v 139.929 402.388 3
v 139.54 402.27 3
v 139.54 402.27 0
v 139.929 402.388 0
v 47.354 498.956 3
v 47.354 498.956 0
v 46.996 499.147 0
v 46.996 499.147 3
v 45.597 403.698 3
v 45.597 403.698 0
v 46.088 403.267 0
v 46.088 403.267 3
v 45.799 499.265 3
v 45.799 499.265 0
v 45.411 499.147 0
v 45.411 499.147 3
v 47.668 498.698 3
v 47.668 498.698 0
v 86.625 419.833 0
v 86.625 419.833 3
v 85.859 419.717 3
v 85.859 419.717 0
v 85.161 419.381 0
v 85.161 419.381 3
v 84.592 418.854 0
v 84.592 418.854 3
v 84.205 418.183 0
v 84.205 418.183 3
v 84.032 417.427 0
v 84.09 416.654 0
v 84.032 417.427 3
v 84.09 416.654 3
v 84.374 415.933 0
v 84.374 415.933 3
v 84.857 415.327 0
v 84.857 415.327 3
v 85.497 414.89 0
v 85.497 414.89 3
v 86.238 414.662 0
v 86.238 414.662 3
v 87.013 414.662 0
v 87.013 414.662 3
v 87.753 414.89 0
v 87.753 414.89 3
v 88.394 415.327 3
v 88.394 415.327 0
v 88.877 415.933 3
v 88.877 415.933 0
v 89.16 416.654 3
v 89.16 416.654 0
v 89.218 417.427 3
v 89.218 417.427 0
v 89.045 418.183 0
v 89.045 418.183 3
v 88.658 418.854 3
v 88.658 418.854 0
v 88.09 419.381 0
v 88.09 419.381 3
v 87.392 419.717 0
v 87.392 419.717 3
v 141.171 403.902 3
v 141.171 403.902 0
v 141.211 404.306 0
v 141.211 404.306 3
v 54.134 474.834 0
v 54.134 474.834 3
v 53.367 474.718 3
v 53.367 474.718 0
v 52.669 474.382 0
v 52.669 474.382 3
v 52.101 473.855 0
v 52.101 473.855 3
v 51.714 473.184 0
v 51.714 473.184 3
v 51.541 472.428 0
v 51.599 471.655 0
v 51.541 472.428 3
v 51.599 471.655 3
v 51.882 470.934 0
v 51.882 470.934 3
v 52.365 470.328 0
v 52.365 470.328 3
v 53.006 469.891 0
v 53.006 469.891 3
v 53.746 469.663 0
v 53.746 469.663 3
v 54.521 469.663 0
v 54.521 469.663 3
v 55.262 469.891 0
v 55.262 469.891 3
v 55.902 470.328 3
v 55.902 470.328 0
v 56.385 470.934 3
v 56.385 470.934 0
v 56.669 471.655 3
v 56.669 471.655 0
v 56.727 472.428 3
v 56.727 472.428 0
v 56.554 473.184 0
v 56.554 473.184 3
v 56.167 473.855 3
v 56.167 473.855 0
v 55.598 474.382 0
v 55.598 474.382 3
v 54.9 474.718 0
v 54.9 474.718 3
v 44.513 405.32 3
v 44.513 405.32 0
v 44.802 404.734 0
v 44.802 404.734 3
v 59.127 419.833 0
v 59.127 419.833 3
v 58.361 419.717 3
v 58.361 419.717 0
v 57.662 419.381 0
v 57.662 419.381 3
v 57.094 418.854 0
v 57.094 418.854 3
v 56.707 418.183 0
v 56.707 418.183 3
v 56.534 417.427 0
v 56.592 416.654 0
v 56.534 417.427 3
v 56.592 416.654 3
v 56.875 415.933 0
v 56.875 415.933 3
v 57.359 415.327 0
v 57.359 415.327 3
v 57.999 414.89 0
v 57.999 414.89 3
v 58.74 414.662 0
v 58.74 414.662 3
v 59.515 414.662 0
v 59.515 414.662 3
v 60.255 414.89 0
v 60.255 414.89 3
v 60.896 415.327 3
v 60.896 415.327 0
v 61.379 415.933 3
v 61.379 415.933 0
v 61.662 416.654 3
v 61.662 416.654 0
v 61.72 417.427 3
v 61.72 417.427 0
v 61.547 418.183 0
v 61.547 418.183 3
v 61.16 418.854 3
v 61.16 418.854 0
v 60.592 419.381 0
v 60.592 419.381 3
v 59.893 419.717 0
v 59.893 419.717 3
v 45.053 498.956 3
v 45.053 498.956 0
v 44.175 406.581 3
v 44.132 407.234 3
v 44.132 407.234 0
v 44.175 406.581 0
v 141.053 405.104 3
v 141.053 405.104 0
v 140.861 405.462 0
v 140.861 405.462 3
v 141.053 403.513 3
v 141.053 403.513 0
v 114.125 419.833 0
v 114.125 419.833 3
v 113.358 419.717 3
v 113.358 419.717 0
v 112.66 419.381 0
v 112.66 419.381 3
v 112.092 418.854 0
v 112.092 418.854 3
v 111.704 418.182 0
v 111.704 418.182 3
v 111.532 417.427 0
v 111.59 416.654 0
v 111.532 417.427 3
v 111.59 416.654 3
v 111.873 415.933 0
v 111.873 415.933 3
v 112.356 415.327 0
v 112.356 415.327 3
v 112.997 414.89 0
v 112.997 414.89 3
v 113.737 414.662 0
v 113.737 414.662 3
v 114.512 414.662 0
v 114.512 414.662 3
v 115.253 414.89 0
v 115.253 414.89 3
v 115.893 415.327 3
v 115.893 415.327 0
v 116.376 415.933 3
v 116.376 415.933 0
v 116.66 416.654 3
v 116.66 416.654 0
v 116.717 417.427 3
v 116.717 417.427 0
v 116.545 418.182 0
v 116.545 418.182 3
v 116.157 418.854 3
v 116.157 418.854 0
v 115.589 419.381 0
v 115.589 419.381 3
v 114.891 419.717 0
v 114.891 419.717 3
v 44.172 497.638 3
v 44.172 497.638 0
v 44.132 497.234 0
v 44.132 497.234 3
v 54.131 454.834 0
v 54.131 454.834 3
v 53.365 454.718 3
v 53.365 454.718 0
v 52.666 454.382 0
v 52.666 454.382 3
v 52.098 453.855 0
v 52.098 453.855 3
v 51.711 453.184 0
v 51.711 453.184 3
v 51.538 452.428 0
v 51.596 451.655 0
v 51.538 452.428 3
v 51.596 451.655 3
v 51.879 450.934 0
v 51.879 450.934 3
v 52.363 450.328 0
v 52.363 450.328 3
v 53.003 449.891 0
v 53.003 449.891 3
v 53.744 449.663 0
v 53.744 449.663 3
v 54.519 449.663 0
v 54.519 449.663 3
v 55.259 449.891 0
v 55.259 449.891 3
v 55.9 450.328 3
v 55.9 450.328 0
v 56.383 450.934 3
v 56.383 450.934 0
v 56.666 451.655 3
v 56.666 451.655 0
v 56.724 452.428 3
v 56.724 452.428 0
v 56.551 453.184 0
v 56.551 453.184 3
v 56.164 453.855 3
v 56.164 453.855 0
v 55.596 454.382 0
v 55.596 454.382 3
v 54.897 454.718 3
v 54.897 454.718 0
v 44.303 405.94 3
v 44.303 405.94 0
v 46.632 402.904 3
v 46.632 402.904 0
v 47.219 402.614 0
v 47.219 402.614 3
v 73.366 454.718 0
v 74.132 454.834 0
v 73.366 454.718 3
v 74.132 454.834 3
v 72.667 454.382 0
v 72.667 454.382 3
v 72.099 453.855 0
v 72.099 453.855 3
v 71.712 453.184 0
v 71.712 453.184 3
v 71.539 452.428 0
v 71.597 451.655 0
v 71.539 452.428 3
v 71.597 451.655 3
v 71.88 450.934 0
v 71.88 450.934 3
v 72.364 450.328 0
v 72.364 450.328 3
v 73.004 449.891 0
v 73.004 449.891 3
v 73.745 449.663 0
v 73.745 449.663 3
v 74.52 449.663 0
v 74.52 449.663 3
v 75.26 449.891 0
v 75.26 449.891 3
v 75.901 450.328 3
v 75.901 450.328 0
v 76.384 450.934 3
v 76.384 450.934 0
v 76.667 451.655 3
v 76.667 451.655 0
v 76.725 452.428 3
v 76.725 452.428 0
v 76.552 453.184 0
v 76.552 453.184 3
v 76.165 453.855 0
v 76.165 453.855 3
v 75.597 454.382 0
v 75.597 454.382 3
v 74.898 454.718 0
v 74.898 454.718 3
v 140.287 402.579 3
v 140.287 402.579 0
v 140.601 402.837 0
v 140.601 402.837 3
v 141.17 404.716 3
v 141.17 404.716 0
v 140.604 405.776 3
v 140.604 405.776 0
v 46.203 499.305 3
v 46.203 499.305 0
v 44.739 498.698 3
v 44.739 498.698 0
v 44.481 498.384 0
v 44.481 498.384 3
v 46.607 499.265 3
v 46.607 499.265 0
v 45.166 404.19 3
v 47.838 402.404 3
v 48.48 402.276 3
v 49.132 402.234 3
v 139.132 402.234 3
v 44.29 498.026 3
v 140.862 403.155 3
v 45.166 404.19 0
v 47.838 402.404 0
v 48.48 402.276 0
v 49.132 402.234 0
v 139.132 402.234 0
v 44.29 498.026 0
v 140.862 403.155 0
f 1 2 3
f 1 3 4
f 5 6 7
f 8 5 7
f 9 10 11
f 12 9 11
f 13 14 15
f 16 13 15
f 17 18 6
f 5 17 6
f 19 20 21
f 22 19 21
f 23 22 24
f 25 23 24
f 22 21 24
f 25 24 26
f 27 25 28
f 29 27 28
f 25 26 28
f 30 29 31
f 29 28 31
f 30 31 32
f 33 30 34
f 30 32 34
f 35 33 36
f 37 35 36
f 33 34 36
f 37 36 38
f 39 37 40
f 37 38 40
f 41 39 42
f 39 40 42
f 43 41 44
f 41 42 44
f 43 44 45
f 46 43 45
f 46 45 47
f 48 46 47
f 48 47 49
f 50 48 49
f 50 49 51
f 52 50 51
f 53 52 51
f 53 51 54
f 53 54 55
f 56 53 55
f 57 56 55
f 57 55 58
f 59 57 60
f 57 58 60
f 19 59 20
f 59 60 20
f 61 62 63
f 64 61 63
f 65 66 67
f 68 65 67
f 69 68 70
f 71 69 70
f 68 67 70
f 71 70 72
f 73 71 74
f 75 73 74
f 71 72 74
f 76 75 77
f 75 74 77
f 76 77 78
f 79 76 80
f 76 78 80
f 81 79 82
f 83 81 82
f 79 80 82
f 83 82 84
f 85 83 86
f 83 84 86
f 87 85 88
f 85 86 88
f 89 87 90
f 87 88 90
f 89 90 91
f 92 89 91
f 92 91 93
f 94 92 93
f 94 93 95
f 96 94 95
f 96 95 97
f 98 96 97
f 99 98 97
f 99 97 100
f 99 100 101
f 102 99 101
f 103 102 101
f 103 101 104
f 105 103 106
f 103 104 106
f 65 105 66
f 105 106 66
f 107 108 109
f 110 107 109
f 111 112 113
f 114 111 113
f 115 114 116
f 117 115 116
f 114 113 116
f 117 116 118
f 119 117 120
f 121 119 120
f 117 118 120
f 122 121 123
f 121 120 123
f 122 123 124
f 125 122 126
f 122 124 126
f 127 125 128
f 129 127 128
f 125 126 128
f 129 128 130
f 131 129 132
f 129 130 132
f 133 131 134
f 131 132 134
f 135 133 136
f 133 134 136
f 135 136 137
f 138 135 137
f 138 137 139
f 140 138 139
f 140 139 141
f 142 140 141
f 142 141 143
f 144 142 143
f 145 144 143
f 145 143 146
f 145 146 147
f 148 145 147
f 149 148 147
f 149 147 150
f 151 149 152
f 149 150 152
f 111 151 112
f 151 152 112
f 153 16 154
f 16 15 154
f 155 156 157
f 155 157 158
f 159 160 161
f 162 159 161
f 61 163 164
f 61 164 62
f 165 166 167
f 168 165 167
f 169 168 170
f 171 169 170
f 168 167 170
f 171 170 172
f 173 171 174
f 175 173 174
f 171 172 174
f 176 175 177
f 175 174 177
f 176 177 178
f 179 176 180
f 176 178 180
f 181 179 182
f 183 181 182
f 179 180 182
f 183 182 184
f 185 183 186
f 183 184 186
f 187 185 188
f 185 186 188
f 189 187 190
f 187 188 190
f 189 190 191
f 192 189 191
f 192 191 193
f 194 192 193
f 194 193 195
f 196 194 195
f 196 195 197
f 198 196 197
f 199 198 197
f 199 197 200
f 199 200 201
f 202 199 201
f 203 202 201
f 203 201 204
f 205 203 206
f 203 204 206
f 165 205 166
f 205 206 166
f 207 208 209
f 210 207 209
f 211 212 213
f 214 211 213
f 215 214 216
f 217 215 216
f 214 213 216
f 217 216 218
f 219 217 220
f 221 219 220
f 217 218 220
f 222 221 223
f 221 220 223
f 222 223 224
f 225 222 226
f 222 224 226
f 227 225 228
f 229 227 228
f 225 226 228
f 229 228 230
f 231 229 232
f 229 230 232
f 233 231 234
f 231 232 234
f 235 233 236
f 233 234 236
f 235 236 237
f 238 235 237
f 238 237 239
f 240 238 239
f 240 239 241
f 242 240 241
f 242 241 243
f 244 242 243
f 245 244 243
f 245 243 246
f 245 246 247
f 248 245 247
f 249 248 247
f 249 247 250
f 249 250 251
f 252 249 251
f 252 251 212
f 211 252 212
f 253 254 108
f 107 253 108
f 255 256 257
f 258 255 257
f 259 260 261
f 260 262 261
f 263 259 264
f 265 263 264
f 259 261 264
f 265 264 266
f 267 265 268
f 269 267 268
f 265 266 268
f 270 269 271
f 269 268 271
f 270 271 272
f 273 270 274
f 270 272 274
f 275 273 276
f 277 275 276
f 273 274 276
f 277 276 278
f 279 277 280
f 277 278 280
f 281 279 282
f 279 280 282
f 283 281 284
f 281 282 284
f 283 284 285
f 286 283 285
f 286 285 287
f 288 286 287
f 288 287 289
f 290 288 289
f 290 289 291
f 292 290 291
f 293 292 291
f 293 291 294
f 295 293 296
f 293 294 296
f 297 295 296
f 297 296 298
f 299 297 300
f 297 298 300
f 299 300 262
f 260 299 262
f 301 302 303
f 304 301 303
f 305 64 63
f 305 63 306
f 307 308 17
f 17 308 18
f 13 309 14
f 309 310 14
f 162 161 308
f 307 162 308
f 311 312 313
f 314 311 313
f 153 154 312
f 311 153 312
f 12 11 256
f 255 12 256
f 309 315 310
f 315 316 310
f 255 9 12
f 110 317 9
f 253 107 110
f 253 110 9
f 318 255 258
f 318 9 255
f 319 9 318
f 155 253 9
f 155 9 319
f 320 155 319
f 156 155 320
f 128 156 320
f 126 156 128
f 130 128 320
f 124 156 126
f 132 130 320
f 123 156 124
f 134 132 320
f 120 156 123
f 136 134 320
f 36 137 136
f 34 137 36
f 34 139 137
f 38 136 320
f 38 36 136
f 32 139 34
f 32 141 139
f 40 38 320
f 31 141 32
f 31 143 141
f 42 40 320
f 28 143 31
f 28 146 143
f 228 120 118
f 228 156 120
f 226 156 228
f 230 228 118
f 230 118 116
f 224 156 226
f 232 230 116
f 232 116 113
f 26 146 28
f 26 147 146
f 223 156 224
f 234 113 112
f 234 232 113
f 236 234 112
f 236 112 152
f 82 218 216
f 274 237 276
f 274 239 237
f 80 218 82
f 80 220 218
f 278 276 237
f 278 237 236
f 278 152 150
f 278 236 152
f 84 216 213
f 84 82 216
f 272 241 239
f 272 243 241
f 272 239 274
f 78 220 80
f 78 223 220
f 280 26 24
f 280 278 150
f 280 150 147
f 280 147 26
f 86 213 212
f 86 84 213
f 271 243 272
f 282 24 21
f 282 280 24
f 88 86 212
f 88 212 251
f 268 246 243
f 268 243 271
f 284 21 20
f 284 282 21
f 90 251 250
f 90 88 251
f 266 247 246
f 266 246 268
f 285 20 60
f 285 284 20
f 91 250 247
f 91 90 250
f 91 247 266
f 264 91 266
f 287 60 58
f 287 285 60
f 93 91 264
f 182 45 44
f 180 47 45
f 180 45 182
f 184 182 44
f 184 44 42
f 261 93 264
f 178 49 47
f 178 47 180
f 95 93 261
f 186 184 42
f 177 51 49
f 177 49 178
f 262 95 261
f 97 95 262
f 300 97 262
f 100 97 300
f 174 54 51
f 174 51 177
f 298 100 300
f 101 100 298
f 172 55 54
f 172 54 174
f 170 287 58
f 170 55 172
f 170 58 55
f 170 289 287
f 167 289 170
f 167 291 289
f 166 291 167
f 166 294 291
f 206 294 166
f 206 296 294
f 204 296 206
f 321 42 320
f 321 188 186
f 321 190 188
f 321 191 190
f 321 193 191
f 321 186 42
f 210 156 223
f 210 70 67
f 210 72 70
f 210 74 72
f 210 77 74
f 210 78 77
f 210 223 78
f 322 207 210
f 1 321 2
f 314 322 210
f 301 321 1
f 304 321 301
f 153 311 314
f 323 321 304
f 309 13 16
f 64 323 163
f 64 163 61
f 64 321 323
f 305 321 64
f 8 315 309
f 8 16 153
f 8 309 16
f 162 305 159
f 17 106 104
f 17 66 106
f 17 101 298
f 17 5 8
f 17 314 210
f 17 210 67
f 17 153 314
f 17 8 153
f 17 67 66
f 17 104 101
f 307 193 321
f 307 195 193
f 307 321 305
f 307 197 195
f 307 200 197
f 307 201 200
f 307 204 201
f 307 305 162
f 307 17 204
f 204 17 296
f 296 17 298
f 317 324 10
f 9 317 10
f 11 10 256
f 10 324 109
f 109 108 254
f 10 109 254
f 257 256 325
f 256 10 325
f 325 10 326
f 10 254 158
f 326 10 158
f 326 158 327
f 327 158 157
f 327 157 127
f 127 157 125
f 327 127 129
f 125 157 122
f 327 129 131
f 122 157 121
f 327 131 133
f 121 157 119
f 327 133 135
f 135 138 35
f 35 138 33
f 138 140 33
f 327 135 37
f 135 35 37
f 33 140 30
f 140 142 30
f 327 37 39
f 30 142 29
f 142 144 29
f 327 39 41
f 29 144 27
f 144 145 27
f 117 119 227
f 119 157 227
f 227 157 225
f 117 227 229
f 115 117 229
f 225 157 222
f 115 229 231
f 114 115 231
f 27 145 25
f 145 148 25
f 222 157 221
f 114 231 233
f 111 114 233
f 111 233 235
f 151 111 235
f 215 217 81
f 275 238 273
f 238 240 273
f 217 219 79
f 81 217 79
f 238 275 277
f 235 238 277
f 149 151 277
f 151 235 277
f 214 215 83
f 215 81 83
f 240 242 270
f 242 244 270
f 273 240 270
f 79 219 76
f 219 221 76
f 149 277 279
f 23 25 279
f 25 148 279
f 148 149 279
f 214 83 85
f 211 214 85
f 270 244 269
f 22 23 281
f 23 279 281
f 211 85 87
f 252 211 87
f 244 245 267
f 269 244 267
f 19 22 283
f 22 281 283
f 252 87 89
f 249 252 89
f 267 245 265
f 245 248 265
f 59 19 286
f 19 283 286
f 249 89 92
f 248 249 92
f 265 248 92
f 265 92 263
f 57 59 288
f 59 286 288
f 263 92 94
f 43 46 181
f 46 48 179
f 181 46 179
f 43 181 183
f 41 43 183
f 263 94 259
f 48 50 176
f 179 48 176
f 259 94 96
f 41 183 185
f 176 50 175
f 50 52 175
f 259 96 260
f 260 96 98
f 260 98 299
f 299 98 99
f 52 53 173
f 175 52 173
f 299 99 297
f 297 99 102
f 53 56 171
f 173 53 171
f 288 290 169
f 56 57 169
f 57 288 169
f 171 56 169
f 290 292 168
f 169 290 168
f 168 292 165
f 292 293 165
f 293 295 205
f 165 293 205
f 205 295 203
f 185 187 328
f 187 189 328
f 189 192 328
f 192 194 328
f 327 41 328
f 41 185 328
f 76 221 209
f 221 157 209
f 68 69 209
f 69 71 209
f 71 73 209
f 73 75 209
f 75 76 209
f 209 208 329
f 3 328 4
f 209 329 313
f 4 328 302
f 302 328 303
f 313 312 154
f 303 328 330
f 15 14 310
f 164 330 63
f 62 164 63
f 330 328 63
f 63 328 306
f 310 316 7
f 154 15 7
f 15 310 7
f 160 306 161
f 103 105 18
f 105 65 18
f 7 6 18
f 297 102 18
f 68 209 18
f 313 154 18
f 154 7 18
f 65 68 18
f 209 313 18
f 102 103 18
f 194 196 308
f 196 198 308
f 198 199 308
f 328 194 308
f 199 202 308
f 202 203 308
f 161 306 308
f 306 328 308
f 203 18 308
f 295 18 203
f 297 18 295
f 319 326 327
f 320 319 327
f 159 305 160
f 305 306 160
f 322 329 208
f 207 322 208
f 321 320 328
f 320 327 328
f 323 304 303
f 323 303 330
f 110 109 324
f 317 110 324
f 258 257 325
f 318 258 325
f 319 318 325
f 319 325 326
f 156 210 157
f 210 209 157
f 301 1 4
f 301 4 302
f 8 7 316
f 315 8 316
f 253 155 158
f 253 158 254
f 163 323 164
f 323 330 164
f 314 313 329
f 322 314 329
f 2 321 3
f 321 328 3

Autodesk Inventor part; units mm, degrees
ref_plane "YZ Plane" through (0, 0, 0) normal (1, 0, 0) x (0, 1, 0)
ref_plane "XZ Plane" through (0, 0, 0) normal (0, 1, 0) x (-1, 0, 0)
ref_plane "XY Plane" through (0, 0, 0) normal (0, 0, 1) x (1, 0, 0)
sketch "Sketch1" plane through (0, 0, 0) normal (0, 0, 1) x (1, 0, 0)
  line L0 (141.1705, 404.7157) -> (141.0527, 405.1042)
  line L1 (141.0527, 405.1042) -> (140.8612, 405.4623)
  line L2 (140.8612, 405.4623) -> (140.6037, 405.7761)
  line L3 (140.6037, 405.7761) -> (47.6678, 498.6981)
  line L4 (47.6678, 498.6981) -> (47.354, 498.9557)
  line L5 (47.354, 498.9557) -> (46.9959, 499.1471)
  line L6 (46.9959, 499.1471) -> (46.6074, 499.265)
  line L7 (46.6074, 499.265) -> (46.2034, 499.3048)
  line L8 (46.2034, 499.3048) -> (45.7993, 499.265)
  line L9 (45.7993, 499.265) -> (45.4108, 499.1471)
  line L10 (45.4108, 499.1471) -> (45.0528, 498.9557)
  line L11 (45.0528, 498.9557) -> (44.7389, 498.6982)
  line L12 (44.7389, 498.6982) -> (44.4814, 498.3843)
  line L13 (44.4814, 498.3843) -> (44.29, 498.0263)
  line L14 (44.29, 498.0263) -> (44.1721, 497.6378)
  line L15 (44.1721, 497.6378) -> (44.1323, 497.2337)
  line L16 (44.1323, 497.2337) -> (44.1323, 407.2337)
  line L17 (44.1323, 407.2337) -> (44.1751, 406.5811)
  line L18 (44.1751, 406.5811) -> (44.3027, 405.9396)
  line L19 (44.3027, 405.9396) -> (44.5129, 405.3203)
  line L20 (44.5129, 405.3203) -> (44.8022, 404.7337)
  line L21 (44.8022, 404.7337) -> (45.1655, 404.1899)
  line L22 (45.1655, 404.1899) -> (45.5968, 403.6982)
  line L23 (45.5968, 403.6982) -> (46.0885, 403.2669)
  line L24 (46.0885, 403.2669) -> (46.6323, 402.9036)
  line L25 (46.6323, 402.9036) -> (47.2189, 402.6143)
  line L26 (47.2189, 402.6143) -> (47.8382, 402.4041)
  line L27 (47.8382, 402.4041) -> (48.4797, 402.2765)
  line L28 (48.4797, 402.2765) -> (49.1323, 402.2337)
  line L29 (49.1323, 402.2337) -> (139.1323, 402.2337)
  line L30 (139.1323, 402.2337) -> (139.5404, 402.2701)
  line L31 (139.5404, 402.2701) -> (139.929, 402.3879)
  line L32 (139.929, 402.3879) -> (140.287, 402.5794)
  line L33 (140.287, 402.5794) -> (140.6008, 402.8369)
  line L34 (140.6008, 402.8369) -> (140.8618, 403.1549)
  line L35 (140.8618, 403.1549) -> (141.0532, 403.513)
  line L36 (141.0532, 403.513) -> (141.1711, 403.9015)
  line L37 (141.1711, 403.9015) -> (141.2109, 404.3055)
  line L38 (141.2109, 404.3055) -> (141.1705, 404.7157)
  line L39 (89.0593, 417.8849) -> (88.8076, 418.4926)
  line L40 (88.8076, 418.4926) -> (88.4071, 419.0145)
  line L41 (88.4071, 419.0145) -> (87.8852, 419.415)
  line L42 (87.8852, 419.415) -> (87.2774, 419.6668)
  line L43 (87.2774, 419.6668) -> (86.6252, 419.7526)
  line L44 (86.6252, 419.7526) -> (85.973, 419.6669)
  line L45 (85.973, 419.6669) -> (85.3652, 419.4151)
  line L46 (85.3652, 419.4151) -> (84.8433, 419.0147)
  line L47 (84.8433, 419.0147) -> (84.4428, 418.4928)
  line L48 (84.4428, 418.4928) -> (84.1911, 417.885)
  line L49 (84.1911, 417.885) -> (84.1052, 417.2328)
  line L50 (84.1052, 417.2328) -> (84.191, 416.5805)
  line L51 (84.191, 416.5805) -> (84.4427, 415.9728)
  line L52 (84.4427, 415.9728) -> (84.8432, 415.4509)
  line L53 (84.8432, 415.4509) -> (85.3651, 415.0503)
  line L54 (85.3651, 415.0503) -> (85.9728, 414.7986)
  line L55 (85.9728, 414.7986) -> (86.6251, 414.7128)
  line L56 (86.6251, 414.7128) -> (87.2773, 414.7985)
  line L57 (87.2773, 414.7985) -> (87.8851, 415.0503)
  line L58 (87.8851, 415.0503) -> (88.407, 415.4507)
  line L59 (88.407, 415.4507) -> (88.8075, 415.9726)
  line L60 (88.8075, 415.9726) -> (89.0592, 416.5803)
  line L61 (89.0592, 416.5803) -> (89.1451, 417.2326)
  line L62 (89.1451, 417.2326) -> (89.0593, 417.8849)
  line L63 (61.5613, 417.885) -> (61.3095, 418.4929)
  line L64 (61.3095, 418.4929) -> (60.9091, 419.0148)
  line L65 (60.9091, 419.0148) -> (60.3872, 419.4153)
  line L66 (60.3872, 419.4153) -> (59.7794, 419.667)
  line L67 (59.7794, 419.667) -> (59.1271, 419.7529)
  line L68 (59.1271, 419.7529) -> (58.4749, 419.6671)
  line L69 (58.4749, 419.6671) -> (57.8671, 419.4154)
  line L70 (57.8671, 419.4154) -> (57.3452, 419.0149)
  line L71 (57.3452, 419.0149) -> (56.9447, 418.493)
  line L72 (56.9447, 418.493) -> (56.693, 417.8853)
  line L73 (56.693, 417.8853) -> (56.6071, 417.233)
  line L74 (56.6071, 417.233) -> (56.6929, 416.5808)
  line L75 (56.6929, 416.5808) -> (56.9446, 415.973)
  line L76 (56.9446, 415.973) -> (57.3451, 415.4511)
  line L77 (57.3451, 415.4511) -> (57.867, 415.0506)
  line L78 (57.867, 415.0506) -> (58.4748, 414.7989)
  line L79 (58.4748, 414.7989) -> (59.127, 414.713)
  line L80 (59.127, 414.713) -> (59.7792, 414.7988)
  line L81 (59.7792, 414.7988) -> (60.387, 415.0505)
  line L82 (60.387, 415.0505) -> (60.9089, 415.451)
  line L83 (60.9089, 415.451) -> (61.3094, 415.9729)
  line L84 (61.3094, 415.9729) -> (61.5611, 416.5806)
  line L85 (61.5611, 416.5806) -> (61.647, 417.233)
  line L86 (61.647, 417.233) -> (61.5613, 417.885)
  line L87 (56.5942, 452.8937) -> (56.3395, 453.5086)
  line L88 (56.3395, 453.5086) -> (55.9343, 454.0367)
  line L89 (55.9343, 454.0367) -> (55.4062, 454.4419)
  line L90 (55.4062, 454.4419) -> (54.7911, 454.6967)
  line L91 (54.7911, 454.6967) -> (54.1311, 454.7836)
  line L92 (54.1311, 454.7836) -> (53.4711, 454.6968)
  line L93 (53.4711, 454.6968) -> (52.8561, 454.4421)
  line L94 (52.8561, 454.4421) -> (52.328, 454.0368)
  line L95 (52.328, 454.0368) -> (51.9227, 453.5087)
  line L96 (51.9227, 453.5087) -> (51.668, 452.8937)
  line L97 (51.668, 452.8937) -> (51.5811, 452.2338)
  line L98 (51.5811, 452.2338) -> (51.6679, 451.5738)
  line L99 (51.6679, 451.5738) -> (51.9226, 450.9587)
  line L100 (51.9226, 450.9587) -> (52.3279, 450.4306)
  line L101 (52.3279, 450.4306) -> (52.856, 450.0253)
  line L102 (52.856, 450.0253) -> (53.471, 449.7706)
  line L103 (53.471, 449.7706) -> (54.131, 449.6837)
  line L104 (54.131, 449.6837) -> (54.791, 449.7705)
  line L105 (54.791, 449.7705) -> (55.406, 450.0252)
  line L106 (55.406, 450.0252) -> (55.9341, 450.4305)
  line L107 (55.9341, 450.4305) -> (56.3394, 450.9586)
  line L108 (56.3394, 450.9586) -> (56.5941, 451.5736)
  line L109 (56.5941, 451.5736) -> (56.681, 452.2337)
  line L110 (56.681, 452.2337) -> (56.5942, 452.8937)
  line L111 (56.597, 472.894) -> (56.3423, 473.509)
  line L112 (56.3423, 473.509) -> (55.9371, 474.0371)
  line L113 (55.9371, 474.0371) -> (55.409, 474.4424)
  line L114 (55.409, 474.4424) -> (54.794, 474.6971)
  line L115 (54.794, 474.6971) -> (54.1339, 474.784)
  line L116 (54.1339, 474.784) -> (53.4739, 474.6972)
  line L117 (53.4739, 474.6972) -> (52.8589, 474.4425)
  line L118 (52.8589, 474.4425) -> (52.3308, 474.0372)
  line L119 (52.3308, 474.0372) -> (51.9255, 473.5091)
  line L120 (51.9255, 473.5091) -> (51.6708, 472.8941)
  line L121 (51.6708, 472.8941) -> (51.5839, 472.2341)
  line L122 (51.5839, 472.2341) -> (51.6707, 471.5741)
  line L123 (51.6707, 471.5741) -> (51.9254, 470.9591)
  line L124 (51.9254, 470.9591) -> (52.3307, 470.431)
  line L125 (52.3307, 470.431) -> (52.8588, 470.0257)
  line L126 (52.8588, 470.0257) -> (53.4738, 469.771)
  line L127 (53.4738, 469.771) -> (54.1337, 469.6841)
  line L128 (54.1337, 469.6841) -> (54.7938, 469.7709)
  line L129 (54.7938, 469.7709) -> (55.4087, 470.0256)
  line L130 (55.4087, 470.0256) -> (55.9369, 470.4309)
  line L131 (55.9369, 470.4309) -> (56.3422, 470.959)
  line L132 (56.3422, 470.959) -> (56.5969, 471.574)
  line L133 (56.5969, 471.574) -> (56.6838, 472.2341)
  line L134 (56.6838, 472.2341) -> (56.597, 472.894)
  line L135 (76.5952, 452.8937) -> (76.3405, 453.5086)
  line L136 (76.3405, 453.5086) -> (75.9352, 454.0368)
  line L137 (75.9352, 454.0368) -> (75.4071, 454.442)
  line L138 (75.4071, 454.442) -> (74.7921, 454.6968)
  line L139 (74.7921, 454.6968) -> (74.1322, 454.7837)
  line L140 (74.1322, 454.7837) -> (73.4722, 454.6969)
  line L141 (73.4722, 454.6969) -> (72.8571, 454.4421)
  line L142 (72.8571, 454.4421) -> (72.329, 454.0369)
  line L143 (72.329, 454.0369) -> (71.9237, 453.5088)
  line L144 (71.9237, 453.5088) -> (71.669, 452.8938)
  line L145 (71.669, 452.8938) -> (71.5821, 452.2338)
  line L146 (71.5821, 452.2338) -> (71.6689, 451.5738)
  line L147 (71.6689, 451.5738) -> (71.9237, 450.9588)
  line L148 (71.9237, 450.9588) -> (72.3289, 450.4307)
  line L149 (72.3289, 450.4307) -> (72.857, 450.0254)
  line L150 (72.857, 450.0254) -> (73.472, 449.7706)
  line L151 (73.472, 449.7706) -> (74.132, 449.6838)
  line L152 (74.132, 449.6838) -> (74.792, 449.7705)
  line L153 (74.792, 449.7705) -> (75.407, 450.0253)
  line L154 (75.407, 450.0253) -> (75.9352, 450.4305)
  line L155 (75.9352, 450.4305) -> (76.3404, 450.9586)
  line L156 (76.3404, 450.9586) -> (76.5952, 451.5736)
  line L157 (76.5952, 451.5736) -> (76.682, 452.2334)
  line L158 (76.682, 452.2334) -> (76.5952, 452.8937)
  line L159 (116.5587, 417.8849) -> (116.307, 418.4926)
  line L160 (116.307, 418.4926) -> (115.9066, 419.0145)
  line L161 (115.9066, 419.0145) -> (115.3847, 419.415)
  line L162 (115.3847, 419.415) -> (114.7769, 419.6667)
  line L163 (114.7769, 419.6667) -> (114.1247, 419.7526)
  line L164 (114.1247, 419.7526) -> (113.4724, 419.6668)
  line L165 (113.4724, 419.6668) -> (112.8647, 419.415)
  line L166 (112.8647, 419.415) -> (112.3428, 419.0146)
  line L167 (112.3428, 419.0146) -> (111.9423, 418.4927)
  line L168 (111.9423, 418.4927) -> (111.6905, 417.8849)
  line L169 (111.6905, 417.8849) -> (111.6047, 417.2327)
  line L170 (111.6047, 417.2327) -> (111.6904, 416.5804)
  line L171 (111.6904, 416.5804) -> (111.9422, 415.9727)
  line L172 (111.9422, 415.9727) -> (112.3426, 415.4508)
  line L173 (112.3426, 415.4508) -> (112.8645, 415.0503)
  line L174 (112.8645, 415.0503) -> (113.4723, 414.7986)
  line L175 (113.4723, 414.7986) -> (114.1246, 414.7127)
  line L176 (114.1246, 414.7127) -> (114.7768, 414.7985)
  line L177 (114.7768, 414.7985) -> (115.3846, 415.0502)
  line L178 (115.3846, 415.0502) -> (115.9065, 415.4507)
  line L179 (115.9065, 415.4507) -> (116.307, 415.9726)
  line L180 (116.307, 415.9726) -> (116.5587, 416.5802)
  line L181 (116.5587, 416.5802) -> (116.6445, 417.2325)
  line L182 (116.6445, 417.2325) -> (116.5587, 417.8849)
  point P0 (0, 0)
extrude "Extrusion1" add sketch "Sketch1" along normal blind 3
sketch "Sketch2" plane through (0, 0, 0) normal (0, 0, -1) x (-1, 0, 0)
  line L0 (-56.6838, 472.2341) -> (-56.597, 472.894) projected
  line L1 (-56.597, 472.894) -> (-56.3423, 473.509) projected
  line L2 (-56.3423, 473.509) -> (-55.9371, 474.0371) projected
  line L3 (-55.9371, 474.0371) -> (-55.409, 474.4424) projected
  line L4 (-55.409, 474.4424) -> (-54.794, 474.6971) projected
  line L5 (-54.794, 474.6971) -> (-54.1339, 474.784) projected
  line L6 (-54.1339, 474.784) -> (-53.4739, 474.6972) projected
  line L7 (-53.4739, 474.6972) -> (-52.8589, 474.4425) projected
  line L8 (-52.8589, 474.4425) -> (-52.3308, 474.0372) projected
  line L9 (-52.3308, 474.0372) -> (-51.9255, 473.5091) projected
  line L10 (-51.9255, 473.5091) -> (-51.6708, 472.8941) projected
  line L11 (-51.6708, 472.8941) -> (-51.5839, 472.2341) projected
  line L12 (-51.5839, 472.2341) -> (-51.6707, 471.5741) projected
  line L13 (-51.6707, 471.5741) -> (-51.9254, 470.9591) projected
  line L14 (-51.9254, 470.9591) -> (-52.3307, 470.431) projected
  line L15 (-52.3307, 470.431) -> (-52.8588, 470.0257) projected
  line L16 (-52.8588, 470.0257) -> (-53.4738, 469.771) projected
  line L17 (-53.4738, 469.771) -> (-54.1337, 469.6841) projected
  line L18 (-54.1337, 469.6841) -> (-54.7938, 469.7709) projected
  line L19 (-54.7938, 469.7709) -> (-55.4087, 470.0256) projected
  line L20 (-55.4087, 470.0256) -> (-55.9369, 470.4309) projected
  line L21 (-55.9369, 470.4309) -> (-56.3422, 470.959) projected
  line L22 (-56.3422, 470.959) -> (-56.5969, 471.574) projected
  line L23 (-56.5969, 471.574) -> (-56.6838, 472.2341) projected
  line L24 (-76.682, 452.2334) -> (-76.5952, 452.8937) projected
  line L25 (-76.5952, 452.8937) -> (-76.3405, 453.5086) projected
  line L26 (-76.3405, 453.5086) -> (-75.9352, 454.0368) projected
  line L27 (-75.9352, 454.0368) -> (-75.4071, 454.442) projected
  line L28 (-75.4071, 454.442) -> (-74.7921, 454.6968) projected
  line L29 (-74.7921, 454.6968) -> (-74.1322, 454.7837) projected
  line L30 (-74.1322, 454.7837) -> (-73.4722, 454.6969) projected
  line L31 (-73.4722, 454.6969) -> (-72.8571, 454.4421) projected
  line L32 (-72.8571, 454.4421) -> (-72.329, 454.0369) projected
  line L33 (-72.329, 454.0369) -> (-71.9237, 453.5088) projected
  line L34 (-71.9237, 453.5088) -> (-71.669, 452.8938) projected
  line L35 (-71.669, 452.8938) -> (-71.5821, 452.2338) projected
  line L36 (-71.5821, 452.2338) -> (-71.6689, 451.5738) projected
  line L37 (-71.6689, 451.5738) -> (-71.9237, 450.9588) projected
  line L38 (-71.9237, 450.9588) -> (-72.3289, 450.4307) projected
  line L39 (-72.3289, 450.4307) -> (-72.857, 450.0254) projected
  line L40 (-72.857, 450.0254) -> (-73.472, 449.7706) projected
  line L41 (-73.472, 449.7706) -> (-74.132, 449.6838) projected
  line L42 (-74.132, 449.6838) -> (-74.792, 449.7705) projected
  line L43 (-74.792, 449.7705) -> (-75.407, 450.0253) projected
  line L44 (-75.407, 450.0253) -> (-75.9352, 450.4305) projected
  line L45 (-75.9352, 450.4305) -> (-76.3404, 450.9586) projected
  line L46 (-76.3404, 450.9586) -> (-76.5952, 451.5736) projected
  line L47 (-76.5952, 451.5736) -> (-76.682, 452.2334) projected
  line L48 (-56.681, 452.2337) -> (-56.5942, 452.8937) projected
  line L49 (-56.5942, 452.8937) -> (-56.3395, 453.5086) projected
  line L50 (-56.3395, 453.5086) -> (-55.9343, 454.0367) projected
  line L51 (-55.9343, 454.0367) -> (-55.4062, 454.4419) projected
  line L52 (-55.4062, 454.4419) -> (-54.7911, 454.6967) projected
  line L53 (-54.7911, 454.6967) -> (-54.1311, 454.7836) projected
  line L54 (-54.1311, 454.7836) -> (-53.4711, 454.6968) projected
  line L55 (-53.4711, 454.6968) -> (-52.8561, 454.4421) projected
  line L56 (-52.8561, 454.4421) -> (-52.328, 454.0368) projected
  line L57 (-52.328, 454.0368) -> (-51.9227, 453.5087) projected
  line L58 (-51.9227, 453.5087) -> (-51.668, 452.8937) projected
  line L59 (-51.668, 452.8937) -> (-51.5811, 452.2338) projected
  line L60 (-51.5811, 452.2338) -> (-51.6679, 451.5738) projected
  line L61 (-51.6679, 451.5738) -> (-51.9226, 450.9587) projected
  line L62 (-51.9226, 450.9587) -> (-52.3279, 450.4306) projected
  line L63 (-52.3279, 450.4306) -> (-52.856, 450.0253) projected
  line L64 (-52.856, 450.0253) -> (-53.471, 449.7706) projected
  line L65 (-53.471, 449.7706) -> (-54.131, 449.6837) projected
  line L66 (-54.131, 449.6837) -> (-54.791, 449.7705) projected
  line L67 (-54.791, 449.7705) -> (-55.406, 450.0252) projected
  line L68 (-55.406, 450.0252) -> (-55.9341, 450.4305) projected
  line L69 (-55.9341, 450.4305) -> (-56.3394, 450.9586) projected
  line L70 (-56.3394, 450.9586) -> (-56.5941, 451.5736) projected
  line L71 (-56.5941, 451.5736) -> (-56.681, 452.2337) projected
  line L72 (-89.1451, 417.2326) -> (-89.0593, 417.8849) projected
  line L73 (-89.0593, 417.8849) -> (-88.8076, 418.4926) projected
  line L74 (-88.8076, 418.4926) -> (-88.4071, 419.0145) projected
  line L75 (-88.4071, 419.0145) -> (-87.8852, 419.415) projected
  line L76 (-87.8852, 419.415) -> (-87.2774, 419.6668) projected
  line L77 (-87.2774, 419.6668) -> (-86.6252, 419.7526) projected
  line L78 (-86.6252, 419.7526) -> (-85.973, 419.6669) projected
  line L79 (-85.973, 419.6669) -> (-85.3652, 419.4151) projected
  line L80 (-85.3652, 419.4151) -> (-84.8433, 419.0147) projected
  line L81 (-84.8433, 419.0147) -> (-84.4428, 418.4928) projected
  line L82 (-84.4428, 418.4928) -> (-84.1911, 417.885) projected
  line L83 (-84.1911, 417.885) -> (-84.1052, 417.2328) projected
  line L84 (-84.1052, 417.2328) -> (-84.191, 416.5805) projected
  line L85 (-84.191, 416.5805) -> (-84.4427, 415.9728) projected
  line L86 (-84.4427, 415.9728) -> (-84.8432, 415.4509) projected
  line L87 (-84.8432, 415.4509) -> (-85.3651, 415.0503) projected
  line L88 (-85.3651, 415.0503) -> (-85.9728, 414.7986) projected
  line L89 (-85.9728, 414.7986) -> (-86.6251, 414.7128) projected
  line L90 (-86.6251, 414.7128) -> (-87.2773, 414.7985) projected
  line L91 (-87.2773, 414.7985) -> (-87.8851, 415.0503) projected
  line L92 (-87.8851, 415.0503) -> (-88.407, 415.4507) projected
  line L93 (-88.407, 415.4507) -> (-88.8075, 415.9726) projected
  line L94 (-88.8075, 415.9726) -> (-89.0592, 416.5803) projected
  line L95 (-89.0592, 416.5803) -> (-89.1451, 417.2326) projected
  line L96 (-61.647, 417.233) -> (-61.5613, 417.885) projected
  line L97 (-61.5613, 417.885) -> (-61.3095, 418.4929) projected
  line L98 (-61.3095, 418.4929) -> (-60.9091, 419.0148) projected
  line L99 (-60.9091, 419.0148) -> (-60.3872, 419.4153) projected
  line L100 (-60.3872, 419.4153) -> (-59.7794, 419.667) projected
  line L101 (-59.7794, 419.667) -> (-59.1271, 419.7529) projected
  line L102 (-59.1271, 419.7529) -> (-58.4749, 419.6671) projected
  line L103 (-58.4749, 419.6671) -> (-57.8671, 419.4154) projected
  line L104 (-57.8671, 419.4154) -> (-57.3452, 419.0149) projected
  line L105 (-57.3452, 419.0149) -> (-56.9447, 418.493) projected
  line L106 (-56.9447, 418.493) -> (-56.693, 417.8853) projected
  line L107 (-56.693, 417.8853) -> (-56.6071, 417.233) projected
  line L108 (-56.6071, 417.233) -> (-56.6929, 416.5808) projected
  line L109 (-56.6929, 416.5808) -> (-56.9446, 415.973) projected
  line L110 (-56.9446, 415.973) -> (-57.3451, 415.4511) projected
  line L111 (-57.3451, 415.4511) -> (-57.867, 415.0506) projected
  line L112 (-57.867, 415.0506) -> (-58.4748, 414.7989) projected
  line L113 (-58.4748, 414.7989) -> (-59.127, 414.713) projected
  line L114 (-59.127, 414.713) -> (-59.7792, 414.7988) projected
  line L115 (-59.7792, 414.7988) -> (-60.387, 415.0505) projected
  line L116 (-60.387, 415.0505) -> (-60.9089, 415.451) projected
  line L117 (-60.9089, 415.451) -> (-61.3094, 415.9729) projected
  line L118 (-61.3094, 415.9729) -> (-61.5611, 416.5806) projected
  line L119 (-61.5611, 416.5806) -> (-61.647, 417.233) projected
  line L120 (-116.6445, 417.2325) -> (-116.5587, 417.8849) projected
  line L121 (-116.5587, 417.8849) -> (-116.307, 418.4926) projected
  line L122 (-116.307, 418.4926) -> (-115.9066, 419.0145) projected
  line L123 (-115.9066, 419.0145) -> (-115.3847, 419.415) projected
  line L124 (-115.3847, 419.415) -> (-114.7769, 419.6667) projected
  line L125 (-114.7769, 419.6667) -> (-114.1247, 419.7526) projected
  line L126 (-114.1247, 419.7526) -> (-113.4724, 419.6668) projected
  line L127 (-113.4724, 419.6668) -> (-112.8647, 419.415) projected
  line L128 (-112.8647, 419.415) -> (-112.3428, 419.0146) projected
  line L129 (-112.3428, 419.0146) -> (-111.9423, 418.4927) projected
  line L130 (-111.9423, 418.4927) -> (-111.6905, 417.8849) projected
  line L131 (-111.6905, 417.8849) -> (-111.6047, 417.2327) projected
  line L132 (-111.6047, 417.2327) -> (-111.6904, 416.5804) projected
  line L133 (-111.6904, 416.5804) -> (-111.9422, 415.9727) projected
  line L134 (-111.9422, 415.9727) -> (-112.3426, 415.4508) projected
  line L135 (-112.3426, 415.4508) -> (-112.8645, 415.0503) projected
  line L136 (-112.8645, 415.0503) -> (-113.4723, 414.7986) projected
  line L137 (-113.4723, 414.7986) -> (-114.1246, 414.7127) projected
  line L138 (-114.1246, 414.7127) -> (-114.7768, 414.7985) projected
  line L139 (-114.7768, 414.7985) -> (-115.3846, 415.0502) projected
  line L140 (-115.3846, 415.0502) -> (-115.9065, 415.4507) projected
  line L141 (-115.9065, 415.4507) -> (-116.307, 415.9726) projected
  line L142 (-116.307, 415.9726) -> (-116.5587, 416.5802) projected
  line L143 (-116.5587, 416.5802) -> (-116.6445, 417.2325) projected
  line L144 (-141.1705, 404.7157) -> (-141.0527, 405.1042) projected
  line L145 (-141.2109, 404.3055) -> (-141.1705, 404.7157) projected
  line L146 (-141.1711, 403.9015) -> (-141.2109, 404.3055) projected
  line L147 (-141.0532, 403.513) -> (-141.1711, 403.9015) projected
  line L148 (-140.8618, 403.1549) -> (-141.0532, 403.513) projected
  line L149 (-140.6008, 402.8369) -> (-140.8618, 403.1549) projected
  line L150 (-140.287, 402.5794) -> (-140.6008, 402.8369) projected
  line L151 (-139.929, 402.3879) -> (-140.287, 402.5794) projected
  line L152 (-139.5404, 402.2701) -> (-139.929, 402.3879) projected
  line L153 (-139.1323, 402.2337) -> (-139.5404, 402.2701) projected
  line L154 (-49.1323, 402.2337) -> (-139.1323, 402.2337) projected
  line L155 (-48.4797, 402.2765) -> (-49.1323, 402.2337) projected
  line L156 (-47.8382, 402.4041) -> (-48.4797, 402.2765) projected
  line L157 (-47.2189, 402.6143) -> (-47.8382, 402.4041) projected
  line L158 (-46.6323, 402.9036) -> (-47.2189, 402.6143) projected
  line L159 (-46.0885, 403.2669) -> (-46.6323, 402.9036) projected
  line L160 (-45.5968, 403.6982) -> (-46.0885, 403.2669) projected
  line L161 (-45.1655, 404.1899) -> (-45.5968, 403.6982) projected
  line L162 (-44.8022, 404.7337) -> (-45.1655, 404.1899) projected
  line L163 (-44.5129, 405.3203) -> (-44.8022, 404.7337) projected
  line L164 (-44.3027, 405.9396) -> (-44.5129, 405.3203) projected
  line L165 (-44.1751, 406.5811) -> (-44.3027, 405.9396) projected
  line L166 (-44.1323, 407.2337) -> (-44.1751, 406.5811) projected
  line L167 (-44.1323, 497.2337) -> (-44.1323, 407.2337) projected
  line L168 (-44.1721, 497.6378) -> (-44.1323, 497.2337) projected
  line L169 (-44.29, 498.0263) -> (-44.1721, 497.6378) projected
  line L170 (-44.4814, 498.3843) -> (-44.29, 498.0263) projected
  line L171 (-44.7389, 498.6982) -> (-44.4814, 498.3843) projected
  line L172 (-45.0528, 498.9557) -> (-44.7389, 498.6982) projected
  line L173 (-45.4108, 499.1471) -> (-45.0528, 498.9557) projected
  line L174 (-45.7993, 499.265) -> (-45.4108, 499.1471) projected
  line L175 (-46.2034, 499.3048) -> (-45.7993, 499.265) projected
  line L176 (-46.6074, 499.265) -> (-46.2034, 499.3048) projected
  line L177 (-46.9959, 499.1471) -> (-46.6074, 499.265) projected
  line L178 (-47.354, 498.9557) -> (-46.9959, 499.1471) projected
  line L179 (-47.6678, 498.6981) -> (-47.354, 498.9557) projected
  line L180 (-140.6037, 405.7761) -> (-47.6678, 498.6981) projected
  line L181 (-140.8612, 405.4623) -> (-140.6037, 405.7761) projected
  line L182 (-141.0527, 405.1042) -> (-140.8612, 405.4623) projected
  circle A0 centre (-54.1338, 472.234) radius 2.5282
  circle A1 centre (-54.1311, 452.2337) radius 2.5282
  circle A2 centre (-74.1321, 452.2337) radius 2.5282
  circle A3 centre (-86.6252, 417.2327) radius 2.4985
  circle A4 centre (-114.1247, 417.2326) radius 2.4984
  circle A5 centre (-59.1271, 417.2329) radius 2.4984
  point P0 (0, 0)
hole "Hole1" at (114.1247, 417.2326, 0) at (86.6252, 417.2327, 0) at (59.1271, 417.2329, 0) at (54.1311, 452.2337, 0) at (74.1321, 452.2337, 0) at (54.1338, 472.234, 0) direction (0, 0, 1) diameter 5.2 end through all
properties part number "Side Brace"
